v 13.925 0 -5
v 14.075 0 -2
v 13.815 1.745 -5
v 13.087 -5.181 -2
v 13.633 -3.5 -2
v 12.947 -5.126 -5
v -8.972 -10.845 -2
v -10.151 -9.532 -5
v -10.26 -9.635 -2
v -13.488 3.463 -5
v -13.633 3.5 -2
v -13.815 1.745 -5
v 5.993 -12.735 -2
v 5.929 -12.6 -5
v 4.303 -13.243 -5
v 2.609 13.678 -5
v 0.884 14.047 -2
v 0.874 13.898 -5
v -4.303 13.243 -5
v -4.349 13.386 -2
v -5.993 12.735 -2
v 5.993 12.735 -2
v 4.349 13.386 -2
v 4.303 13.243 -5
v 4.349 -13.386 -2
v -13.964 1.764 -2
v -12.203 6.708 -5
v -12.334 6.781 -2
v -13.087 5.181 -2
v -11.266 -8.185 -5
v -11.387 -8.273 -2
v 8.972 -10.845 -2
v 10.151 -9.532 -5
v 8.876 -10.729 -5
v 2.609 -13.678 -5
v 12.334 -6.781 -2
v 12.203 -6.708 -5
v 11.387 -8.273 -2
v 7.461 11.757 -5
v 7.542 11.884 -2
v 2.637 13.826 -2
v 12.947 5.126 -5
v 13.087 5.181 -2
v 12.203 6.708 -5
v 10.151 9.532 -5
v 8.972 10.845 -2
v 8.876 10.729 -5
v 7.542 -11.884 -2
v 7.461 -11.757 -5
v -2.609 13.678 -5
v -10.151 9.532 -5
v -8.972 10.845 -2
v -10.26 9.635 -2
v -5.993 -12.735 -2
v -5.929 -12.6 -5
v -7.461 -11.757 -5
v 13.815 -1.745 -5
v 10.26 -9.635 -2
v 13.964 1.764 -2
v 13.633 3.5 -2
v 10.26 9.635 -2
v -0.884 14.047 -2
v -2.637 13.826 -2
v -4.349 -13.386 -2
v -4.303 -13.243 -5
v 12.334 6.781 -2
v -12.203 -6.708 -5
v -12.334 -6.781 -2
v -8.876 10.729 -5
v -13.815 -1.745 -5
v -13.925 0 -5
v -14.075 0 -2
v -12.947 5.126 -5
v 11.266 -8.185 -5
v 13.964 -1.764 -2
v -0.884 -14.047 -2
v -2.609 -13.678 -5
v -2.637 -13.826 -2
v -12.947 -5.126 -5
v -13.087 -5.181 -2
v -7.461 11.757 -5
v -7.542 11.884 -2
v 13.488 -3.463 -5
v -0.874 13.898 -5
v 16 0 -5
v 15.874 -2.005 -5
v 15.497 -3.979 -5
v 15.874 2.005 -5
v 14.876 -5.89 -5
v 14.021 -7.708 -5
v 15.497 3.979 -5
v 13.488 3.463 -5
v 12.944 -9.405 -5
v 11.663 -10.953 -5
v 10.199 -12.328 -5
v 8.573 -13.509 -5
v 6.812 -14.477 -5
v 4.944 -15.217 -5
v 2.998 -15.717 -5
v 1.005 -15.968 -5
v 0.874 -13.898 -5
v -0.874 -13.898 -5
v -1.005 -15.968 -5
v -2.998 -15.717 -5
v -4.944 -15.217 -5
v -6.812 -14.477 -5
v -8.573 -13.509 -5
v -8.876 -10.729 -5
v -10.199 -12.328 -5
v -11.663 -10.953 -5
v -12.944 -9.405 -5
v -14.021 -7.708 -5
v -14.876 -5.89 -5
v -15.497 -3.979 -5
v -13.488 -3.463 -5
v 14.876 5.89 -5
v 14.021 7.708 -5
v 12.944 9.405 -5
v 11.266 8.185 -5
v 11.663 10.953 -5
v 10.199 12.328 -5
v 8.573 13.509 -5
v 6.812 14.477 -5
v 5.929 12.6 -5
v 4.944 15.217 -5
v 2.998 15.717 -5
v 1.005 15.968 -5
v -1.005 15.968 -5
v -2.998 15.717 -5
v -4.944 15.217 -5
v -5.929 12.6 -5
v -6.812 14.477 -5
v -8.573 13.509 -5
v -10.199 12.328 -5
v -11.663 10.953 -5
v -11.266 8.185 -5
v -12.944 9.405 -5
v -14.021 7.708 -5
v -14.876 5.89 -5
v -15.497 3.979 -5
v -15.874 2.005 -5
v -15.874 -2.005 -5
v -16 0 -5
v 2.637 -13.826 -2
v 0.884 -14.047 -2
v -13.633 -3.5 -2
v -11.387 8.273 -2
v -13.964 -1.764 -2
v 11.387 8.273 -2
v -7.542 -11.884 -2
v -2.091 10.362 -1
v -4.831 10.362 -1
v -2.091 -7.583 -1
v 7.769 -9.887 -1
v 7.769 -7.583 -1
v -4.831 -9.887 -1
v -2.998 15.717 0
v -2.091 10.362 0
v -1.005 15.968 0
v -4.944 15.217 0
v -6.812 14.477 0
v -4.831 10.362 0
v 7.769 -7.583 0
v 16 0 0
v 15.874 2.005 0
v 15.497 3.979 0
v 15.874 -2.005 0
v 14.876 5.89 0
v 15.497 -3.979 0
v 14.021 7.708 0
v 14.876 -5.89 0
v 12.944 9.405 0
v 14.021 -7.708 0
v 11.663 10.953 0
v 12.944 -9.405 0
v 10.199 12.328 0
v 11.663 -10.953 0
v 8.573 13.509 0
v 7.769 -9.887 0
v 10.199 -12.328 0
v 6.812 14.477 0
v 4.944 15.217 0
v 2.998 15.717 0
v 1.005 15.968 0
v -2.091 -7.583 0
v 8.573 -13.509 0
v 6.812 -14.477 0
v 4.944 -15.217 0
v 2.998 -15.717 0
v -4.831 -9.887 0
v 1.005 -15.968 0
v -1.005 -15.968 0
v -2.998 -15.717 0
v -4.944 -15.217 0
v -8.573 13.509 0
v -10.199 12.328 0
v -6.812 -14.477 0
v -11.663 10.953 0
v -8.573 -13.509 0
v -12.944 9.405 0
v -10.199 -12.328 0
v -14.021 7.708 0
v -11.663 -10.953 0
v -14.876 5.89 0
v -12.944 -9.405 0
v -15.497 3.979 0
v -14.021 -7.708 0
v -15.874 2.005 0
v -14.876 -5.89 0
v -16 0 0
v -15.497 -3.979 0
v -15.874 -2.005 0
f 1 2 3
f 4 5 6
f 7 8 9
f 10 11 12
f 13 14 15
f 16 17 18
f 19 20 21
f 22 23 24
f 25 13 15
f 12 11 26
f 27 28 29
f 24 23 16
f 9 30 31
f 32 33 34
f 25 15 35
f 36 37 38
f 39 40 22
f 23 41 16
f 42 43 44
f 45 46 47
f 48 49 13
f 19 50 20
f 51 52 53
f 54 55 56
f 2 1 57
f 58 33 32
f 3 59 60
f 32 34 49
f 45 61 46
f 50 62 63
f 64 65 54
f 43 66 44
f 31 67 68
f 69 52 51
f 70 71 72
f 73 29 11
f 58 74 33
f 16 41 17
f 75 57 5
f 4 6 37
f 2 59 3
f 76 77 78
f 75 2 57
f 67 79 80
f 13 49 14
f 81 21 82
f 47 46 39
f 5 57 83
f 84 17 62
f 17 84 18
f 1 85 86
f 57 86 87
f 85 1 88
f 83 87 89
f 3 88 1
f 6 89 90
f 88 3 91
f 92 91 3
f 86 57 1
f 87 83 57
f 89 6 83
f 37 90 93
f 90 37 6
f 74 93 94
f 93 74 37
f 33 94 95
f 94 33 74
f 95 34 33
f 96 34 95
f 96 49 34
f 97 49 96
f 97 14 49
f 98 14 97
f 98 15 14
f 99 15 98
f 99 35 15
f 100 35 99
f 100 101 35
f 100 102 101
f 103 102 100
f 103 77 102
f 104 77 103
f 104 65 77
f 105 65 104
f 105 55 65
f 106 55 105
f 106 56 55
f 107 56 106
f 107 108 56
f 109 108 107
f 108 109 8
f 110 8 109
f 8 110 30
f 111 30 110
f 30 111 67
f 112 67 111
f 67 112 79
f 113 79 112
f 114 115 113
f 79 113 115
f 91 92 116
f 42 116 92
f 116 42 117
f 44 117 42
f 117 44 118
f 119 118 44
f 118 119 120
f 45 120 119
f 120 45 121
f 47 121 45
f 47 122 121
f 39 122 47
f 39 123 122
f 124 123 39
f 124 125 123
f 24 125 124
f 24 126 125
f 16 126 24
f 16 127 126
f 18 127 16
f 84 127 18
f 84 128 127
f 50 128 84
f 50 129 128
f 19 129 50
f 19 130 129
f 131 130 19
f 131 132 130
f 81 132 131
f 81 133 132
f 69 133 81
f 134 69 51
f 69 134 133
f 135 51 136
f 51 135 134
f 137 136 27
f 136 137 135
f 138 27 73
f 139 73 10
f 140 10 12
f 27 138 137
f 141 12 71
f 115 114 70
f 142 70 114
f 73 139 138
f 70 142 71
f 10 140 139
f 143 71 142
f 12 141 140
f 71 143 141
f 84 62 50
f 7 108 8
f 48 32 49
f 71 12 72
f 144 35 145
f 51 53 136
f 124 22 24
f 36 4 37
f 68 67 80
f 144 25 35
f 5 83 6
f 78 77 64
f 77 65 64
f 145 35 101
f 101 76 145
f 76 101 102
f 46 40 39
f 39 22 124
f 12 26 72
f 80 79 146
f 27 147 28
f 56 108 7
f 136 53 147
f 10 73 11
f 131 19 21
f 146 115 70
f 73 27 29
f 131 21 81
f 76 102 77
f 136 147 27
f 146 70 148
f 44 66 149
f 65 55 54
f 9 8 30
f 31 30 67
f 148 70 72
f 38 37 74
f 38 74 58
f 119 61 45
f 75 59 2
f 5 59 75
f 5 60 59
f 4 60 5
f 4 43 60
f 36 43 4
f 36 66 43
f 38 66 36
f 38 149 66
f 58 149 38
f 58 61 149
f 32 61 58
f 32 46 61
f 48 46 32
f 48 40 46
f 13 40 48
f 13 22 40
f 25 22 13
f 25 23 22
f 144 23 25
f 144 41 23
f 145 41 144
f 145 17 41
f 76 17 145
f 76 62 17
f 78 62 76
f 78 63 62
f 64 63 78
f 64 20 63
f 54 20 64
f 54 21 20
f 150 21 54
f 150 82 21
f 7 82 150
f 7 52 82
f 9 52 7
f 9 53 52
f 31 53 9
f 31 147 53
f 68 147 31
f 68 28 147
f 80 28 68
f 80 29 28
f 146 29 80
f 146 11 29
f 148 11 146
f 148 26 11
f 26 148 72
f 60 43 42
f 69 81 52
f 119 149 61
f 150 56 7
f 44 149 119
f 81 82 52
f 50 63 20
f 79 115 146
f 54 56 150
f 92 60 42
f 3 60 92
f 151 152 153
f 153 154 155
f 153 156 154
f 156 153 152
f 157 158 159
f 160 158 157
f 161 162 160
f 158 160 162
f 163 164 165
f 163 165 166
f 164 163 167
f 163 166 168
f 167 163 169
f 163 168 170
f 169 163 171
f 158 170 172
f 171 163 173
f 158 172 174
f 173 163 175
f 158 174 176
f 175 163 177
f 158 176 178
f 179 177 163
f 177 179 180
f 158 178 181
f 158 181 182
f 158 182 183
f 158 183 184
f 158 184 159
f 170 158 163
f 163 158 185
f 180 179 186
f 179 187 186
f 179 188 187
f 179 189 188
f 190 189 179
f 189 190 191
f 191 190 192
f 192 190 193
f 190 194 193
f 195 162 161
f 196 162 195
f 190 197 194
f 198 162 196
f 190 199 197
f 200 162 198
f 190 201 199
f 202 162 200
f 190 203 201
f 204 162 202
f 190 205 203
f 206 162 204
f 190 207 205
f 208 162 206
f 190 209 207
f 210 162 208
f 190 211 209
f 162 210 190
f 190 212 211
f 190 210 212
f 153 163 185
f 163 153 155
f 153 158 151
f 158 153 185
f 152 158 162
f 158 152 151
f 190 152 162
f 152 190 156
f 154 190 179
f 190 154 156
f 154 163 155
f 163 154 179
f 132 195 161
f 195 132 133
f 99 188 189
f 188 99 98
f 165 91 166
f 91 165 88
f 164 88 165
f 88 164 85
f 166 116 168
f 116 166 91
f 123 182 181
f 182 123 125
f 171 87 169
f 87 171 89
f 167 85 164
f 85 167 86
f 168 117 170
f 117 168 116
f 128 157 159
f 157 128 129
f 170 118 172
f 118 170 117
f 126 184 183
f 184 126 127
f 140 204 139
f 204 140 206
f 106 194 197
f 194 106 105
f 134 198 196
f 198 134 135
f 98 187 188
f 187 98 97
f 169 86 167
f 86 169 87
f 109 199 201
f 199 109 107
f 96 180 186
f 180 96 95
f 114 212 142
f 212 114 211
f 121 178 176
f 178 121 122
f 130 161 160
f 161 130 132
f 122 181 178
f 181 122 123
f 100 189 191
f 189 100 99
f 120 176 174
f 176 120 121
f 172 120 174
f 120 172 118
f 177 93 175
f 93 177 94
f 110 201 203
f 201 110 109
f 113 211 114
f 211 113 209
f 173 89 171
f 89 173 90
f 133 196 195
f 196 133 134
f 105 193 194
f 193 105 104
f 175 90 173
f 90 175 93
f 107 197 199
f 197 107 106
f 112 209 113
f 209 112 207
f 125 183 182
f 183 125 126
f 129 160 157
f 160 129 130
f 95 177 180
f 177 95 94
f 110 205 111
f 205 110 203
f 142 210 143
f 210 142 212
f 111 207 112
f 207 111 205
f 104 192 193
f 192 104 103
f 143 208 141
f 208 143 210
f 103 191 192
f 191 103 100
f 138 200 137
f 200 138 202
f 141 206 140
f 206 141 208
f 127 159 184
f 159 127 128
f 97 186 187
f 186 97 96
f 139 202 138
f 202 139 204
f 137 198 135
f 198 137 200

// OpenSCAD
$fn = 50;


difference() {
	union() {
		translate(v = [0, 0, -5.0000000000]) {
			cylinder(h = 5, r = 16.0000000000);
		}
	}
	union() {
		#translate(v = [0, 0, -5.0000000000]) {
			cylinder(h = 3, r1 = 13.9250000000, r2 = 14.0750000000);
		}
		translate(v = [0, 0, -1]) {
			linear_extrude(height = 1) {
				text(font = "Impact", halign = "center", size = 20, text = "L", valign = "center");
			}
		}
	}
}
